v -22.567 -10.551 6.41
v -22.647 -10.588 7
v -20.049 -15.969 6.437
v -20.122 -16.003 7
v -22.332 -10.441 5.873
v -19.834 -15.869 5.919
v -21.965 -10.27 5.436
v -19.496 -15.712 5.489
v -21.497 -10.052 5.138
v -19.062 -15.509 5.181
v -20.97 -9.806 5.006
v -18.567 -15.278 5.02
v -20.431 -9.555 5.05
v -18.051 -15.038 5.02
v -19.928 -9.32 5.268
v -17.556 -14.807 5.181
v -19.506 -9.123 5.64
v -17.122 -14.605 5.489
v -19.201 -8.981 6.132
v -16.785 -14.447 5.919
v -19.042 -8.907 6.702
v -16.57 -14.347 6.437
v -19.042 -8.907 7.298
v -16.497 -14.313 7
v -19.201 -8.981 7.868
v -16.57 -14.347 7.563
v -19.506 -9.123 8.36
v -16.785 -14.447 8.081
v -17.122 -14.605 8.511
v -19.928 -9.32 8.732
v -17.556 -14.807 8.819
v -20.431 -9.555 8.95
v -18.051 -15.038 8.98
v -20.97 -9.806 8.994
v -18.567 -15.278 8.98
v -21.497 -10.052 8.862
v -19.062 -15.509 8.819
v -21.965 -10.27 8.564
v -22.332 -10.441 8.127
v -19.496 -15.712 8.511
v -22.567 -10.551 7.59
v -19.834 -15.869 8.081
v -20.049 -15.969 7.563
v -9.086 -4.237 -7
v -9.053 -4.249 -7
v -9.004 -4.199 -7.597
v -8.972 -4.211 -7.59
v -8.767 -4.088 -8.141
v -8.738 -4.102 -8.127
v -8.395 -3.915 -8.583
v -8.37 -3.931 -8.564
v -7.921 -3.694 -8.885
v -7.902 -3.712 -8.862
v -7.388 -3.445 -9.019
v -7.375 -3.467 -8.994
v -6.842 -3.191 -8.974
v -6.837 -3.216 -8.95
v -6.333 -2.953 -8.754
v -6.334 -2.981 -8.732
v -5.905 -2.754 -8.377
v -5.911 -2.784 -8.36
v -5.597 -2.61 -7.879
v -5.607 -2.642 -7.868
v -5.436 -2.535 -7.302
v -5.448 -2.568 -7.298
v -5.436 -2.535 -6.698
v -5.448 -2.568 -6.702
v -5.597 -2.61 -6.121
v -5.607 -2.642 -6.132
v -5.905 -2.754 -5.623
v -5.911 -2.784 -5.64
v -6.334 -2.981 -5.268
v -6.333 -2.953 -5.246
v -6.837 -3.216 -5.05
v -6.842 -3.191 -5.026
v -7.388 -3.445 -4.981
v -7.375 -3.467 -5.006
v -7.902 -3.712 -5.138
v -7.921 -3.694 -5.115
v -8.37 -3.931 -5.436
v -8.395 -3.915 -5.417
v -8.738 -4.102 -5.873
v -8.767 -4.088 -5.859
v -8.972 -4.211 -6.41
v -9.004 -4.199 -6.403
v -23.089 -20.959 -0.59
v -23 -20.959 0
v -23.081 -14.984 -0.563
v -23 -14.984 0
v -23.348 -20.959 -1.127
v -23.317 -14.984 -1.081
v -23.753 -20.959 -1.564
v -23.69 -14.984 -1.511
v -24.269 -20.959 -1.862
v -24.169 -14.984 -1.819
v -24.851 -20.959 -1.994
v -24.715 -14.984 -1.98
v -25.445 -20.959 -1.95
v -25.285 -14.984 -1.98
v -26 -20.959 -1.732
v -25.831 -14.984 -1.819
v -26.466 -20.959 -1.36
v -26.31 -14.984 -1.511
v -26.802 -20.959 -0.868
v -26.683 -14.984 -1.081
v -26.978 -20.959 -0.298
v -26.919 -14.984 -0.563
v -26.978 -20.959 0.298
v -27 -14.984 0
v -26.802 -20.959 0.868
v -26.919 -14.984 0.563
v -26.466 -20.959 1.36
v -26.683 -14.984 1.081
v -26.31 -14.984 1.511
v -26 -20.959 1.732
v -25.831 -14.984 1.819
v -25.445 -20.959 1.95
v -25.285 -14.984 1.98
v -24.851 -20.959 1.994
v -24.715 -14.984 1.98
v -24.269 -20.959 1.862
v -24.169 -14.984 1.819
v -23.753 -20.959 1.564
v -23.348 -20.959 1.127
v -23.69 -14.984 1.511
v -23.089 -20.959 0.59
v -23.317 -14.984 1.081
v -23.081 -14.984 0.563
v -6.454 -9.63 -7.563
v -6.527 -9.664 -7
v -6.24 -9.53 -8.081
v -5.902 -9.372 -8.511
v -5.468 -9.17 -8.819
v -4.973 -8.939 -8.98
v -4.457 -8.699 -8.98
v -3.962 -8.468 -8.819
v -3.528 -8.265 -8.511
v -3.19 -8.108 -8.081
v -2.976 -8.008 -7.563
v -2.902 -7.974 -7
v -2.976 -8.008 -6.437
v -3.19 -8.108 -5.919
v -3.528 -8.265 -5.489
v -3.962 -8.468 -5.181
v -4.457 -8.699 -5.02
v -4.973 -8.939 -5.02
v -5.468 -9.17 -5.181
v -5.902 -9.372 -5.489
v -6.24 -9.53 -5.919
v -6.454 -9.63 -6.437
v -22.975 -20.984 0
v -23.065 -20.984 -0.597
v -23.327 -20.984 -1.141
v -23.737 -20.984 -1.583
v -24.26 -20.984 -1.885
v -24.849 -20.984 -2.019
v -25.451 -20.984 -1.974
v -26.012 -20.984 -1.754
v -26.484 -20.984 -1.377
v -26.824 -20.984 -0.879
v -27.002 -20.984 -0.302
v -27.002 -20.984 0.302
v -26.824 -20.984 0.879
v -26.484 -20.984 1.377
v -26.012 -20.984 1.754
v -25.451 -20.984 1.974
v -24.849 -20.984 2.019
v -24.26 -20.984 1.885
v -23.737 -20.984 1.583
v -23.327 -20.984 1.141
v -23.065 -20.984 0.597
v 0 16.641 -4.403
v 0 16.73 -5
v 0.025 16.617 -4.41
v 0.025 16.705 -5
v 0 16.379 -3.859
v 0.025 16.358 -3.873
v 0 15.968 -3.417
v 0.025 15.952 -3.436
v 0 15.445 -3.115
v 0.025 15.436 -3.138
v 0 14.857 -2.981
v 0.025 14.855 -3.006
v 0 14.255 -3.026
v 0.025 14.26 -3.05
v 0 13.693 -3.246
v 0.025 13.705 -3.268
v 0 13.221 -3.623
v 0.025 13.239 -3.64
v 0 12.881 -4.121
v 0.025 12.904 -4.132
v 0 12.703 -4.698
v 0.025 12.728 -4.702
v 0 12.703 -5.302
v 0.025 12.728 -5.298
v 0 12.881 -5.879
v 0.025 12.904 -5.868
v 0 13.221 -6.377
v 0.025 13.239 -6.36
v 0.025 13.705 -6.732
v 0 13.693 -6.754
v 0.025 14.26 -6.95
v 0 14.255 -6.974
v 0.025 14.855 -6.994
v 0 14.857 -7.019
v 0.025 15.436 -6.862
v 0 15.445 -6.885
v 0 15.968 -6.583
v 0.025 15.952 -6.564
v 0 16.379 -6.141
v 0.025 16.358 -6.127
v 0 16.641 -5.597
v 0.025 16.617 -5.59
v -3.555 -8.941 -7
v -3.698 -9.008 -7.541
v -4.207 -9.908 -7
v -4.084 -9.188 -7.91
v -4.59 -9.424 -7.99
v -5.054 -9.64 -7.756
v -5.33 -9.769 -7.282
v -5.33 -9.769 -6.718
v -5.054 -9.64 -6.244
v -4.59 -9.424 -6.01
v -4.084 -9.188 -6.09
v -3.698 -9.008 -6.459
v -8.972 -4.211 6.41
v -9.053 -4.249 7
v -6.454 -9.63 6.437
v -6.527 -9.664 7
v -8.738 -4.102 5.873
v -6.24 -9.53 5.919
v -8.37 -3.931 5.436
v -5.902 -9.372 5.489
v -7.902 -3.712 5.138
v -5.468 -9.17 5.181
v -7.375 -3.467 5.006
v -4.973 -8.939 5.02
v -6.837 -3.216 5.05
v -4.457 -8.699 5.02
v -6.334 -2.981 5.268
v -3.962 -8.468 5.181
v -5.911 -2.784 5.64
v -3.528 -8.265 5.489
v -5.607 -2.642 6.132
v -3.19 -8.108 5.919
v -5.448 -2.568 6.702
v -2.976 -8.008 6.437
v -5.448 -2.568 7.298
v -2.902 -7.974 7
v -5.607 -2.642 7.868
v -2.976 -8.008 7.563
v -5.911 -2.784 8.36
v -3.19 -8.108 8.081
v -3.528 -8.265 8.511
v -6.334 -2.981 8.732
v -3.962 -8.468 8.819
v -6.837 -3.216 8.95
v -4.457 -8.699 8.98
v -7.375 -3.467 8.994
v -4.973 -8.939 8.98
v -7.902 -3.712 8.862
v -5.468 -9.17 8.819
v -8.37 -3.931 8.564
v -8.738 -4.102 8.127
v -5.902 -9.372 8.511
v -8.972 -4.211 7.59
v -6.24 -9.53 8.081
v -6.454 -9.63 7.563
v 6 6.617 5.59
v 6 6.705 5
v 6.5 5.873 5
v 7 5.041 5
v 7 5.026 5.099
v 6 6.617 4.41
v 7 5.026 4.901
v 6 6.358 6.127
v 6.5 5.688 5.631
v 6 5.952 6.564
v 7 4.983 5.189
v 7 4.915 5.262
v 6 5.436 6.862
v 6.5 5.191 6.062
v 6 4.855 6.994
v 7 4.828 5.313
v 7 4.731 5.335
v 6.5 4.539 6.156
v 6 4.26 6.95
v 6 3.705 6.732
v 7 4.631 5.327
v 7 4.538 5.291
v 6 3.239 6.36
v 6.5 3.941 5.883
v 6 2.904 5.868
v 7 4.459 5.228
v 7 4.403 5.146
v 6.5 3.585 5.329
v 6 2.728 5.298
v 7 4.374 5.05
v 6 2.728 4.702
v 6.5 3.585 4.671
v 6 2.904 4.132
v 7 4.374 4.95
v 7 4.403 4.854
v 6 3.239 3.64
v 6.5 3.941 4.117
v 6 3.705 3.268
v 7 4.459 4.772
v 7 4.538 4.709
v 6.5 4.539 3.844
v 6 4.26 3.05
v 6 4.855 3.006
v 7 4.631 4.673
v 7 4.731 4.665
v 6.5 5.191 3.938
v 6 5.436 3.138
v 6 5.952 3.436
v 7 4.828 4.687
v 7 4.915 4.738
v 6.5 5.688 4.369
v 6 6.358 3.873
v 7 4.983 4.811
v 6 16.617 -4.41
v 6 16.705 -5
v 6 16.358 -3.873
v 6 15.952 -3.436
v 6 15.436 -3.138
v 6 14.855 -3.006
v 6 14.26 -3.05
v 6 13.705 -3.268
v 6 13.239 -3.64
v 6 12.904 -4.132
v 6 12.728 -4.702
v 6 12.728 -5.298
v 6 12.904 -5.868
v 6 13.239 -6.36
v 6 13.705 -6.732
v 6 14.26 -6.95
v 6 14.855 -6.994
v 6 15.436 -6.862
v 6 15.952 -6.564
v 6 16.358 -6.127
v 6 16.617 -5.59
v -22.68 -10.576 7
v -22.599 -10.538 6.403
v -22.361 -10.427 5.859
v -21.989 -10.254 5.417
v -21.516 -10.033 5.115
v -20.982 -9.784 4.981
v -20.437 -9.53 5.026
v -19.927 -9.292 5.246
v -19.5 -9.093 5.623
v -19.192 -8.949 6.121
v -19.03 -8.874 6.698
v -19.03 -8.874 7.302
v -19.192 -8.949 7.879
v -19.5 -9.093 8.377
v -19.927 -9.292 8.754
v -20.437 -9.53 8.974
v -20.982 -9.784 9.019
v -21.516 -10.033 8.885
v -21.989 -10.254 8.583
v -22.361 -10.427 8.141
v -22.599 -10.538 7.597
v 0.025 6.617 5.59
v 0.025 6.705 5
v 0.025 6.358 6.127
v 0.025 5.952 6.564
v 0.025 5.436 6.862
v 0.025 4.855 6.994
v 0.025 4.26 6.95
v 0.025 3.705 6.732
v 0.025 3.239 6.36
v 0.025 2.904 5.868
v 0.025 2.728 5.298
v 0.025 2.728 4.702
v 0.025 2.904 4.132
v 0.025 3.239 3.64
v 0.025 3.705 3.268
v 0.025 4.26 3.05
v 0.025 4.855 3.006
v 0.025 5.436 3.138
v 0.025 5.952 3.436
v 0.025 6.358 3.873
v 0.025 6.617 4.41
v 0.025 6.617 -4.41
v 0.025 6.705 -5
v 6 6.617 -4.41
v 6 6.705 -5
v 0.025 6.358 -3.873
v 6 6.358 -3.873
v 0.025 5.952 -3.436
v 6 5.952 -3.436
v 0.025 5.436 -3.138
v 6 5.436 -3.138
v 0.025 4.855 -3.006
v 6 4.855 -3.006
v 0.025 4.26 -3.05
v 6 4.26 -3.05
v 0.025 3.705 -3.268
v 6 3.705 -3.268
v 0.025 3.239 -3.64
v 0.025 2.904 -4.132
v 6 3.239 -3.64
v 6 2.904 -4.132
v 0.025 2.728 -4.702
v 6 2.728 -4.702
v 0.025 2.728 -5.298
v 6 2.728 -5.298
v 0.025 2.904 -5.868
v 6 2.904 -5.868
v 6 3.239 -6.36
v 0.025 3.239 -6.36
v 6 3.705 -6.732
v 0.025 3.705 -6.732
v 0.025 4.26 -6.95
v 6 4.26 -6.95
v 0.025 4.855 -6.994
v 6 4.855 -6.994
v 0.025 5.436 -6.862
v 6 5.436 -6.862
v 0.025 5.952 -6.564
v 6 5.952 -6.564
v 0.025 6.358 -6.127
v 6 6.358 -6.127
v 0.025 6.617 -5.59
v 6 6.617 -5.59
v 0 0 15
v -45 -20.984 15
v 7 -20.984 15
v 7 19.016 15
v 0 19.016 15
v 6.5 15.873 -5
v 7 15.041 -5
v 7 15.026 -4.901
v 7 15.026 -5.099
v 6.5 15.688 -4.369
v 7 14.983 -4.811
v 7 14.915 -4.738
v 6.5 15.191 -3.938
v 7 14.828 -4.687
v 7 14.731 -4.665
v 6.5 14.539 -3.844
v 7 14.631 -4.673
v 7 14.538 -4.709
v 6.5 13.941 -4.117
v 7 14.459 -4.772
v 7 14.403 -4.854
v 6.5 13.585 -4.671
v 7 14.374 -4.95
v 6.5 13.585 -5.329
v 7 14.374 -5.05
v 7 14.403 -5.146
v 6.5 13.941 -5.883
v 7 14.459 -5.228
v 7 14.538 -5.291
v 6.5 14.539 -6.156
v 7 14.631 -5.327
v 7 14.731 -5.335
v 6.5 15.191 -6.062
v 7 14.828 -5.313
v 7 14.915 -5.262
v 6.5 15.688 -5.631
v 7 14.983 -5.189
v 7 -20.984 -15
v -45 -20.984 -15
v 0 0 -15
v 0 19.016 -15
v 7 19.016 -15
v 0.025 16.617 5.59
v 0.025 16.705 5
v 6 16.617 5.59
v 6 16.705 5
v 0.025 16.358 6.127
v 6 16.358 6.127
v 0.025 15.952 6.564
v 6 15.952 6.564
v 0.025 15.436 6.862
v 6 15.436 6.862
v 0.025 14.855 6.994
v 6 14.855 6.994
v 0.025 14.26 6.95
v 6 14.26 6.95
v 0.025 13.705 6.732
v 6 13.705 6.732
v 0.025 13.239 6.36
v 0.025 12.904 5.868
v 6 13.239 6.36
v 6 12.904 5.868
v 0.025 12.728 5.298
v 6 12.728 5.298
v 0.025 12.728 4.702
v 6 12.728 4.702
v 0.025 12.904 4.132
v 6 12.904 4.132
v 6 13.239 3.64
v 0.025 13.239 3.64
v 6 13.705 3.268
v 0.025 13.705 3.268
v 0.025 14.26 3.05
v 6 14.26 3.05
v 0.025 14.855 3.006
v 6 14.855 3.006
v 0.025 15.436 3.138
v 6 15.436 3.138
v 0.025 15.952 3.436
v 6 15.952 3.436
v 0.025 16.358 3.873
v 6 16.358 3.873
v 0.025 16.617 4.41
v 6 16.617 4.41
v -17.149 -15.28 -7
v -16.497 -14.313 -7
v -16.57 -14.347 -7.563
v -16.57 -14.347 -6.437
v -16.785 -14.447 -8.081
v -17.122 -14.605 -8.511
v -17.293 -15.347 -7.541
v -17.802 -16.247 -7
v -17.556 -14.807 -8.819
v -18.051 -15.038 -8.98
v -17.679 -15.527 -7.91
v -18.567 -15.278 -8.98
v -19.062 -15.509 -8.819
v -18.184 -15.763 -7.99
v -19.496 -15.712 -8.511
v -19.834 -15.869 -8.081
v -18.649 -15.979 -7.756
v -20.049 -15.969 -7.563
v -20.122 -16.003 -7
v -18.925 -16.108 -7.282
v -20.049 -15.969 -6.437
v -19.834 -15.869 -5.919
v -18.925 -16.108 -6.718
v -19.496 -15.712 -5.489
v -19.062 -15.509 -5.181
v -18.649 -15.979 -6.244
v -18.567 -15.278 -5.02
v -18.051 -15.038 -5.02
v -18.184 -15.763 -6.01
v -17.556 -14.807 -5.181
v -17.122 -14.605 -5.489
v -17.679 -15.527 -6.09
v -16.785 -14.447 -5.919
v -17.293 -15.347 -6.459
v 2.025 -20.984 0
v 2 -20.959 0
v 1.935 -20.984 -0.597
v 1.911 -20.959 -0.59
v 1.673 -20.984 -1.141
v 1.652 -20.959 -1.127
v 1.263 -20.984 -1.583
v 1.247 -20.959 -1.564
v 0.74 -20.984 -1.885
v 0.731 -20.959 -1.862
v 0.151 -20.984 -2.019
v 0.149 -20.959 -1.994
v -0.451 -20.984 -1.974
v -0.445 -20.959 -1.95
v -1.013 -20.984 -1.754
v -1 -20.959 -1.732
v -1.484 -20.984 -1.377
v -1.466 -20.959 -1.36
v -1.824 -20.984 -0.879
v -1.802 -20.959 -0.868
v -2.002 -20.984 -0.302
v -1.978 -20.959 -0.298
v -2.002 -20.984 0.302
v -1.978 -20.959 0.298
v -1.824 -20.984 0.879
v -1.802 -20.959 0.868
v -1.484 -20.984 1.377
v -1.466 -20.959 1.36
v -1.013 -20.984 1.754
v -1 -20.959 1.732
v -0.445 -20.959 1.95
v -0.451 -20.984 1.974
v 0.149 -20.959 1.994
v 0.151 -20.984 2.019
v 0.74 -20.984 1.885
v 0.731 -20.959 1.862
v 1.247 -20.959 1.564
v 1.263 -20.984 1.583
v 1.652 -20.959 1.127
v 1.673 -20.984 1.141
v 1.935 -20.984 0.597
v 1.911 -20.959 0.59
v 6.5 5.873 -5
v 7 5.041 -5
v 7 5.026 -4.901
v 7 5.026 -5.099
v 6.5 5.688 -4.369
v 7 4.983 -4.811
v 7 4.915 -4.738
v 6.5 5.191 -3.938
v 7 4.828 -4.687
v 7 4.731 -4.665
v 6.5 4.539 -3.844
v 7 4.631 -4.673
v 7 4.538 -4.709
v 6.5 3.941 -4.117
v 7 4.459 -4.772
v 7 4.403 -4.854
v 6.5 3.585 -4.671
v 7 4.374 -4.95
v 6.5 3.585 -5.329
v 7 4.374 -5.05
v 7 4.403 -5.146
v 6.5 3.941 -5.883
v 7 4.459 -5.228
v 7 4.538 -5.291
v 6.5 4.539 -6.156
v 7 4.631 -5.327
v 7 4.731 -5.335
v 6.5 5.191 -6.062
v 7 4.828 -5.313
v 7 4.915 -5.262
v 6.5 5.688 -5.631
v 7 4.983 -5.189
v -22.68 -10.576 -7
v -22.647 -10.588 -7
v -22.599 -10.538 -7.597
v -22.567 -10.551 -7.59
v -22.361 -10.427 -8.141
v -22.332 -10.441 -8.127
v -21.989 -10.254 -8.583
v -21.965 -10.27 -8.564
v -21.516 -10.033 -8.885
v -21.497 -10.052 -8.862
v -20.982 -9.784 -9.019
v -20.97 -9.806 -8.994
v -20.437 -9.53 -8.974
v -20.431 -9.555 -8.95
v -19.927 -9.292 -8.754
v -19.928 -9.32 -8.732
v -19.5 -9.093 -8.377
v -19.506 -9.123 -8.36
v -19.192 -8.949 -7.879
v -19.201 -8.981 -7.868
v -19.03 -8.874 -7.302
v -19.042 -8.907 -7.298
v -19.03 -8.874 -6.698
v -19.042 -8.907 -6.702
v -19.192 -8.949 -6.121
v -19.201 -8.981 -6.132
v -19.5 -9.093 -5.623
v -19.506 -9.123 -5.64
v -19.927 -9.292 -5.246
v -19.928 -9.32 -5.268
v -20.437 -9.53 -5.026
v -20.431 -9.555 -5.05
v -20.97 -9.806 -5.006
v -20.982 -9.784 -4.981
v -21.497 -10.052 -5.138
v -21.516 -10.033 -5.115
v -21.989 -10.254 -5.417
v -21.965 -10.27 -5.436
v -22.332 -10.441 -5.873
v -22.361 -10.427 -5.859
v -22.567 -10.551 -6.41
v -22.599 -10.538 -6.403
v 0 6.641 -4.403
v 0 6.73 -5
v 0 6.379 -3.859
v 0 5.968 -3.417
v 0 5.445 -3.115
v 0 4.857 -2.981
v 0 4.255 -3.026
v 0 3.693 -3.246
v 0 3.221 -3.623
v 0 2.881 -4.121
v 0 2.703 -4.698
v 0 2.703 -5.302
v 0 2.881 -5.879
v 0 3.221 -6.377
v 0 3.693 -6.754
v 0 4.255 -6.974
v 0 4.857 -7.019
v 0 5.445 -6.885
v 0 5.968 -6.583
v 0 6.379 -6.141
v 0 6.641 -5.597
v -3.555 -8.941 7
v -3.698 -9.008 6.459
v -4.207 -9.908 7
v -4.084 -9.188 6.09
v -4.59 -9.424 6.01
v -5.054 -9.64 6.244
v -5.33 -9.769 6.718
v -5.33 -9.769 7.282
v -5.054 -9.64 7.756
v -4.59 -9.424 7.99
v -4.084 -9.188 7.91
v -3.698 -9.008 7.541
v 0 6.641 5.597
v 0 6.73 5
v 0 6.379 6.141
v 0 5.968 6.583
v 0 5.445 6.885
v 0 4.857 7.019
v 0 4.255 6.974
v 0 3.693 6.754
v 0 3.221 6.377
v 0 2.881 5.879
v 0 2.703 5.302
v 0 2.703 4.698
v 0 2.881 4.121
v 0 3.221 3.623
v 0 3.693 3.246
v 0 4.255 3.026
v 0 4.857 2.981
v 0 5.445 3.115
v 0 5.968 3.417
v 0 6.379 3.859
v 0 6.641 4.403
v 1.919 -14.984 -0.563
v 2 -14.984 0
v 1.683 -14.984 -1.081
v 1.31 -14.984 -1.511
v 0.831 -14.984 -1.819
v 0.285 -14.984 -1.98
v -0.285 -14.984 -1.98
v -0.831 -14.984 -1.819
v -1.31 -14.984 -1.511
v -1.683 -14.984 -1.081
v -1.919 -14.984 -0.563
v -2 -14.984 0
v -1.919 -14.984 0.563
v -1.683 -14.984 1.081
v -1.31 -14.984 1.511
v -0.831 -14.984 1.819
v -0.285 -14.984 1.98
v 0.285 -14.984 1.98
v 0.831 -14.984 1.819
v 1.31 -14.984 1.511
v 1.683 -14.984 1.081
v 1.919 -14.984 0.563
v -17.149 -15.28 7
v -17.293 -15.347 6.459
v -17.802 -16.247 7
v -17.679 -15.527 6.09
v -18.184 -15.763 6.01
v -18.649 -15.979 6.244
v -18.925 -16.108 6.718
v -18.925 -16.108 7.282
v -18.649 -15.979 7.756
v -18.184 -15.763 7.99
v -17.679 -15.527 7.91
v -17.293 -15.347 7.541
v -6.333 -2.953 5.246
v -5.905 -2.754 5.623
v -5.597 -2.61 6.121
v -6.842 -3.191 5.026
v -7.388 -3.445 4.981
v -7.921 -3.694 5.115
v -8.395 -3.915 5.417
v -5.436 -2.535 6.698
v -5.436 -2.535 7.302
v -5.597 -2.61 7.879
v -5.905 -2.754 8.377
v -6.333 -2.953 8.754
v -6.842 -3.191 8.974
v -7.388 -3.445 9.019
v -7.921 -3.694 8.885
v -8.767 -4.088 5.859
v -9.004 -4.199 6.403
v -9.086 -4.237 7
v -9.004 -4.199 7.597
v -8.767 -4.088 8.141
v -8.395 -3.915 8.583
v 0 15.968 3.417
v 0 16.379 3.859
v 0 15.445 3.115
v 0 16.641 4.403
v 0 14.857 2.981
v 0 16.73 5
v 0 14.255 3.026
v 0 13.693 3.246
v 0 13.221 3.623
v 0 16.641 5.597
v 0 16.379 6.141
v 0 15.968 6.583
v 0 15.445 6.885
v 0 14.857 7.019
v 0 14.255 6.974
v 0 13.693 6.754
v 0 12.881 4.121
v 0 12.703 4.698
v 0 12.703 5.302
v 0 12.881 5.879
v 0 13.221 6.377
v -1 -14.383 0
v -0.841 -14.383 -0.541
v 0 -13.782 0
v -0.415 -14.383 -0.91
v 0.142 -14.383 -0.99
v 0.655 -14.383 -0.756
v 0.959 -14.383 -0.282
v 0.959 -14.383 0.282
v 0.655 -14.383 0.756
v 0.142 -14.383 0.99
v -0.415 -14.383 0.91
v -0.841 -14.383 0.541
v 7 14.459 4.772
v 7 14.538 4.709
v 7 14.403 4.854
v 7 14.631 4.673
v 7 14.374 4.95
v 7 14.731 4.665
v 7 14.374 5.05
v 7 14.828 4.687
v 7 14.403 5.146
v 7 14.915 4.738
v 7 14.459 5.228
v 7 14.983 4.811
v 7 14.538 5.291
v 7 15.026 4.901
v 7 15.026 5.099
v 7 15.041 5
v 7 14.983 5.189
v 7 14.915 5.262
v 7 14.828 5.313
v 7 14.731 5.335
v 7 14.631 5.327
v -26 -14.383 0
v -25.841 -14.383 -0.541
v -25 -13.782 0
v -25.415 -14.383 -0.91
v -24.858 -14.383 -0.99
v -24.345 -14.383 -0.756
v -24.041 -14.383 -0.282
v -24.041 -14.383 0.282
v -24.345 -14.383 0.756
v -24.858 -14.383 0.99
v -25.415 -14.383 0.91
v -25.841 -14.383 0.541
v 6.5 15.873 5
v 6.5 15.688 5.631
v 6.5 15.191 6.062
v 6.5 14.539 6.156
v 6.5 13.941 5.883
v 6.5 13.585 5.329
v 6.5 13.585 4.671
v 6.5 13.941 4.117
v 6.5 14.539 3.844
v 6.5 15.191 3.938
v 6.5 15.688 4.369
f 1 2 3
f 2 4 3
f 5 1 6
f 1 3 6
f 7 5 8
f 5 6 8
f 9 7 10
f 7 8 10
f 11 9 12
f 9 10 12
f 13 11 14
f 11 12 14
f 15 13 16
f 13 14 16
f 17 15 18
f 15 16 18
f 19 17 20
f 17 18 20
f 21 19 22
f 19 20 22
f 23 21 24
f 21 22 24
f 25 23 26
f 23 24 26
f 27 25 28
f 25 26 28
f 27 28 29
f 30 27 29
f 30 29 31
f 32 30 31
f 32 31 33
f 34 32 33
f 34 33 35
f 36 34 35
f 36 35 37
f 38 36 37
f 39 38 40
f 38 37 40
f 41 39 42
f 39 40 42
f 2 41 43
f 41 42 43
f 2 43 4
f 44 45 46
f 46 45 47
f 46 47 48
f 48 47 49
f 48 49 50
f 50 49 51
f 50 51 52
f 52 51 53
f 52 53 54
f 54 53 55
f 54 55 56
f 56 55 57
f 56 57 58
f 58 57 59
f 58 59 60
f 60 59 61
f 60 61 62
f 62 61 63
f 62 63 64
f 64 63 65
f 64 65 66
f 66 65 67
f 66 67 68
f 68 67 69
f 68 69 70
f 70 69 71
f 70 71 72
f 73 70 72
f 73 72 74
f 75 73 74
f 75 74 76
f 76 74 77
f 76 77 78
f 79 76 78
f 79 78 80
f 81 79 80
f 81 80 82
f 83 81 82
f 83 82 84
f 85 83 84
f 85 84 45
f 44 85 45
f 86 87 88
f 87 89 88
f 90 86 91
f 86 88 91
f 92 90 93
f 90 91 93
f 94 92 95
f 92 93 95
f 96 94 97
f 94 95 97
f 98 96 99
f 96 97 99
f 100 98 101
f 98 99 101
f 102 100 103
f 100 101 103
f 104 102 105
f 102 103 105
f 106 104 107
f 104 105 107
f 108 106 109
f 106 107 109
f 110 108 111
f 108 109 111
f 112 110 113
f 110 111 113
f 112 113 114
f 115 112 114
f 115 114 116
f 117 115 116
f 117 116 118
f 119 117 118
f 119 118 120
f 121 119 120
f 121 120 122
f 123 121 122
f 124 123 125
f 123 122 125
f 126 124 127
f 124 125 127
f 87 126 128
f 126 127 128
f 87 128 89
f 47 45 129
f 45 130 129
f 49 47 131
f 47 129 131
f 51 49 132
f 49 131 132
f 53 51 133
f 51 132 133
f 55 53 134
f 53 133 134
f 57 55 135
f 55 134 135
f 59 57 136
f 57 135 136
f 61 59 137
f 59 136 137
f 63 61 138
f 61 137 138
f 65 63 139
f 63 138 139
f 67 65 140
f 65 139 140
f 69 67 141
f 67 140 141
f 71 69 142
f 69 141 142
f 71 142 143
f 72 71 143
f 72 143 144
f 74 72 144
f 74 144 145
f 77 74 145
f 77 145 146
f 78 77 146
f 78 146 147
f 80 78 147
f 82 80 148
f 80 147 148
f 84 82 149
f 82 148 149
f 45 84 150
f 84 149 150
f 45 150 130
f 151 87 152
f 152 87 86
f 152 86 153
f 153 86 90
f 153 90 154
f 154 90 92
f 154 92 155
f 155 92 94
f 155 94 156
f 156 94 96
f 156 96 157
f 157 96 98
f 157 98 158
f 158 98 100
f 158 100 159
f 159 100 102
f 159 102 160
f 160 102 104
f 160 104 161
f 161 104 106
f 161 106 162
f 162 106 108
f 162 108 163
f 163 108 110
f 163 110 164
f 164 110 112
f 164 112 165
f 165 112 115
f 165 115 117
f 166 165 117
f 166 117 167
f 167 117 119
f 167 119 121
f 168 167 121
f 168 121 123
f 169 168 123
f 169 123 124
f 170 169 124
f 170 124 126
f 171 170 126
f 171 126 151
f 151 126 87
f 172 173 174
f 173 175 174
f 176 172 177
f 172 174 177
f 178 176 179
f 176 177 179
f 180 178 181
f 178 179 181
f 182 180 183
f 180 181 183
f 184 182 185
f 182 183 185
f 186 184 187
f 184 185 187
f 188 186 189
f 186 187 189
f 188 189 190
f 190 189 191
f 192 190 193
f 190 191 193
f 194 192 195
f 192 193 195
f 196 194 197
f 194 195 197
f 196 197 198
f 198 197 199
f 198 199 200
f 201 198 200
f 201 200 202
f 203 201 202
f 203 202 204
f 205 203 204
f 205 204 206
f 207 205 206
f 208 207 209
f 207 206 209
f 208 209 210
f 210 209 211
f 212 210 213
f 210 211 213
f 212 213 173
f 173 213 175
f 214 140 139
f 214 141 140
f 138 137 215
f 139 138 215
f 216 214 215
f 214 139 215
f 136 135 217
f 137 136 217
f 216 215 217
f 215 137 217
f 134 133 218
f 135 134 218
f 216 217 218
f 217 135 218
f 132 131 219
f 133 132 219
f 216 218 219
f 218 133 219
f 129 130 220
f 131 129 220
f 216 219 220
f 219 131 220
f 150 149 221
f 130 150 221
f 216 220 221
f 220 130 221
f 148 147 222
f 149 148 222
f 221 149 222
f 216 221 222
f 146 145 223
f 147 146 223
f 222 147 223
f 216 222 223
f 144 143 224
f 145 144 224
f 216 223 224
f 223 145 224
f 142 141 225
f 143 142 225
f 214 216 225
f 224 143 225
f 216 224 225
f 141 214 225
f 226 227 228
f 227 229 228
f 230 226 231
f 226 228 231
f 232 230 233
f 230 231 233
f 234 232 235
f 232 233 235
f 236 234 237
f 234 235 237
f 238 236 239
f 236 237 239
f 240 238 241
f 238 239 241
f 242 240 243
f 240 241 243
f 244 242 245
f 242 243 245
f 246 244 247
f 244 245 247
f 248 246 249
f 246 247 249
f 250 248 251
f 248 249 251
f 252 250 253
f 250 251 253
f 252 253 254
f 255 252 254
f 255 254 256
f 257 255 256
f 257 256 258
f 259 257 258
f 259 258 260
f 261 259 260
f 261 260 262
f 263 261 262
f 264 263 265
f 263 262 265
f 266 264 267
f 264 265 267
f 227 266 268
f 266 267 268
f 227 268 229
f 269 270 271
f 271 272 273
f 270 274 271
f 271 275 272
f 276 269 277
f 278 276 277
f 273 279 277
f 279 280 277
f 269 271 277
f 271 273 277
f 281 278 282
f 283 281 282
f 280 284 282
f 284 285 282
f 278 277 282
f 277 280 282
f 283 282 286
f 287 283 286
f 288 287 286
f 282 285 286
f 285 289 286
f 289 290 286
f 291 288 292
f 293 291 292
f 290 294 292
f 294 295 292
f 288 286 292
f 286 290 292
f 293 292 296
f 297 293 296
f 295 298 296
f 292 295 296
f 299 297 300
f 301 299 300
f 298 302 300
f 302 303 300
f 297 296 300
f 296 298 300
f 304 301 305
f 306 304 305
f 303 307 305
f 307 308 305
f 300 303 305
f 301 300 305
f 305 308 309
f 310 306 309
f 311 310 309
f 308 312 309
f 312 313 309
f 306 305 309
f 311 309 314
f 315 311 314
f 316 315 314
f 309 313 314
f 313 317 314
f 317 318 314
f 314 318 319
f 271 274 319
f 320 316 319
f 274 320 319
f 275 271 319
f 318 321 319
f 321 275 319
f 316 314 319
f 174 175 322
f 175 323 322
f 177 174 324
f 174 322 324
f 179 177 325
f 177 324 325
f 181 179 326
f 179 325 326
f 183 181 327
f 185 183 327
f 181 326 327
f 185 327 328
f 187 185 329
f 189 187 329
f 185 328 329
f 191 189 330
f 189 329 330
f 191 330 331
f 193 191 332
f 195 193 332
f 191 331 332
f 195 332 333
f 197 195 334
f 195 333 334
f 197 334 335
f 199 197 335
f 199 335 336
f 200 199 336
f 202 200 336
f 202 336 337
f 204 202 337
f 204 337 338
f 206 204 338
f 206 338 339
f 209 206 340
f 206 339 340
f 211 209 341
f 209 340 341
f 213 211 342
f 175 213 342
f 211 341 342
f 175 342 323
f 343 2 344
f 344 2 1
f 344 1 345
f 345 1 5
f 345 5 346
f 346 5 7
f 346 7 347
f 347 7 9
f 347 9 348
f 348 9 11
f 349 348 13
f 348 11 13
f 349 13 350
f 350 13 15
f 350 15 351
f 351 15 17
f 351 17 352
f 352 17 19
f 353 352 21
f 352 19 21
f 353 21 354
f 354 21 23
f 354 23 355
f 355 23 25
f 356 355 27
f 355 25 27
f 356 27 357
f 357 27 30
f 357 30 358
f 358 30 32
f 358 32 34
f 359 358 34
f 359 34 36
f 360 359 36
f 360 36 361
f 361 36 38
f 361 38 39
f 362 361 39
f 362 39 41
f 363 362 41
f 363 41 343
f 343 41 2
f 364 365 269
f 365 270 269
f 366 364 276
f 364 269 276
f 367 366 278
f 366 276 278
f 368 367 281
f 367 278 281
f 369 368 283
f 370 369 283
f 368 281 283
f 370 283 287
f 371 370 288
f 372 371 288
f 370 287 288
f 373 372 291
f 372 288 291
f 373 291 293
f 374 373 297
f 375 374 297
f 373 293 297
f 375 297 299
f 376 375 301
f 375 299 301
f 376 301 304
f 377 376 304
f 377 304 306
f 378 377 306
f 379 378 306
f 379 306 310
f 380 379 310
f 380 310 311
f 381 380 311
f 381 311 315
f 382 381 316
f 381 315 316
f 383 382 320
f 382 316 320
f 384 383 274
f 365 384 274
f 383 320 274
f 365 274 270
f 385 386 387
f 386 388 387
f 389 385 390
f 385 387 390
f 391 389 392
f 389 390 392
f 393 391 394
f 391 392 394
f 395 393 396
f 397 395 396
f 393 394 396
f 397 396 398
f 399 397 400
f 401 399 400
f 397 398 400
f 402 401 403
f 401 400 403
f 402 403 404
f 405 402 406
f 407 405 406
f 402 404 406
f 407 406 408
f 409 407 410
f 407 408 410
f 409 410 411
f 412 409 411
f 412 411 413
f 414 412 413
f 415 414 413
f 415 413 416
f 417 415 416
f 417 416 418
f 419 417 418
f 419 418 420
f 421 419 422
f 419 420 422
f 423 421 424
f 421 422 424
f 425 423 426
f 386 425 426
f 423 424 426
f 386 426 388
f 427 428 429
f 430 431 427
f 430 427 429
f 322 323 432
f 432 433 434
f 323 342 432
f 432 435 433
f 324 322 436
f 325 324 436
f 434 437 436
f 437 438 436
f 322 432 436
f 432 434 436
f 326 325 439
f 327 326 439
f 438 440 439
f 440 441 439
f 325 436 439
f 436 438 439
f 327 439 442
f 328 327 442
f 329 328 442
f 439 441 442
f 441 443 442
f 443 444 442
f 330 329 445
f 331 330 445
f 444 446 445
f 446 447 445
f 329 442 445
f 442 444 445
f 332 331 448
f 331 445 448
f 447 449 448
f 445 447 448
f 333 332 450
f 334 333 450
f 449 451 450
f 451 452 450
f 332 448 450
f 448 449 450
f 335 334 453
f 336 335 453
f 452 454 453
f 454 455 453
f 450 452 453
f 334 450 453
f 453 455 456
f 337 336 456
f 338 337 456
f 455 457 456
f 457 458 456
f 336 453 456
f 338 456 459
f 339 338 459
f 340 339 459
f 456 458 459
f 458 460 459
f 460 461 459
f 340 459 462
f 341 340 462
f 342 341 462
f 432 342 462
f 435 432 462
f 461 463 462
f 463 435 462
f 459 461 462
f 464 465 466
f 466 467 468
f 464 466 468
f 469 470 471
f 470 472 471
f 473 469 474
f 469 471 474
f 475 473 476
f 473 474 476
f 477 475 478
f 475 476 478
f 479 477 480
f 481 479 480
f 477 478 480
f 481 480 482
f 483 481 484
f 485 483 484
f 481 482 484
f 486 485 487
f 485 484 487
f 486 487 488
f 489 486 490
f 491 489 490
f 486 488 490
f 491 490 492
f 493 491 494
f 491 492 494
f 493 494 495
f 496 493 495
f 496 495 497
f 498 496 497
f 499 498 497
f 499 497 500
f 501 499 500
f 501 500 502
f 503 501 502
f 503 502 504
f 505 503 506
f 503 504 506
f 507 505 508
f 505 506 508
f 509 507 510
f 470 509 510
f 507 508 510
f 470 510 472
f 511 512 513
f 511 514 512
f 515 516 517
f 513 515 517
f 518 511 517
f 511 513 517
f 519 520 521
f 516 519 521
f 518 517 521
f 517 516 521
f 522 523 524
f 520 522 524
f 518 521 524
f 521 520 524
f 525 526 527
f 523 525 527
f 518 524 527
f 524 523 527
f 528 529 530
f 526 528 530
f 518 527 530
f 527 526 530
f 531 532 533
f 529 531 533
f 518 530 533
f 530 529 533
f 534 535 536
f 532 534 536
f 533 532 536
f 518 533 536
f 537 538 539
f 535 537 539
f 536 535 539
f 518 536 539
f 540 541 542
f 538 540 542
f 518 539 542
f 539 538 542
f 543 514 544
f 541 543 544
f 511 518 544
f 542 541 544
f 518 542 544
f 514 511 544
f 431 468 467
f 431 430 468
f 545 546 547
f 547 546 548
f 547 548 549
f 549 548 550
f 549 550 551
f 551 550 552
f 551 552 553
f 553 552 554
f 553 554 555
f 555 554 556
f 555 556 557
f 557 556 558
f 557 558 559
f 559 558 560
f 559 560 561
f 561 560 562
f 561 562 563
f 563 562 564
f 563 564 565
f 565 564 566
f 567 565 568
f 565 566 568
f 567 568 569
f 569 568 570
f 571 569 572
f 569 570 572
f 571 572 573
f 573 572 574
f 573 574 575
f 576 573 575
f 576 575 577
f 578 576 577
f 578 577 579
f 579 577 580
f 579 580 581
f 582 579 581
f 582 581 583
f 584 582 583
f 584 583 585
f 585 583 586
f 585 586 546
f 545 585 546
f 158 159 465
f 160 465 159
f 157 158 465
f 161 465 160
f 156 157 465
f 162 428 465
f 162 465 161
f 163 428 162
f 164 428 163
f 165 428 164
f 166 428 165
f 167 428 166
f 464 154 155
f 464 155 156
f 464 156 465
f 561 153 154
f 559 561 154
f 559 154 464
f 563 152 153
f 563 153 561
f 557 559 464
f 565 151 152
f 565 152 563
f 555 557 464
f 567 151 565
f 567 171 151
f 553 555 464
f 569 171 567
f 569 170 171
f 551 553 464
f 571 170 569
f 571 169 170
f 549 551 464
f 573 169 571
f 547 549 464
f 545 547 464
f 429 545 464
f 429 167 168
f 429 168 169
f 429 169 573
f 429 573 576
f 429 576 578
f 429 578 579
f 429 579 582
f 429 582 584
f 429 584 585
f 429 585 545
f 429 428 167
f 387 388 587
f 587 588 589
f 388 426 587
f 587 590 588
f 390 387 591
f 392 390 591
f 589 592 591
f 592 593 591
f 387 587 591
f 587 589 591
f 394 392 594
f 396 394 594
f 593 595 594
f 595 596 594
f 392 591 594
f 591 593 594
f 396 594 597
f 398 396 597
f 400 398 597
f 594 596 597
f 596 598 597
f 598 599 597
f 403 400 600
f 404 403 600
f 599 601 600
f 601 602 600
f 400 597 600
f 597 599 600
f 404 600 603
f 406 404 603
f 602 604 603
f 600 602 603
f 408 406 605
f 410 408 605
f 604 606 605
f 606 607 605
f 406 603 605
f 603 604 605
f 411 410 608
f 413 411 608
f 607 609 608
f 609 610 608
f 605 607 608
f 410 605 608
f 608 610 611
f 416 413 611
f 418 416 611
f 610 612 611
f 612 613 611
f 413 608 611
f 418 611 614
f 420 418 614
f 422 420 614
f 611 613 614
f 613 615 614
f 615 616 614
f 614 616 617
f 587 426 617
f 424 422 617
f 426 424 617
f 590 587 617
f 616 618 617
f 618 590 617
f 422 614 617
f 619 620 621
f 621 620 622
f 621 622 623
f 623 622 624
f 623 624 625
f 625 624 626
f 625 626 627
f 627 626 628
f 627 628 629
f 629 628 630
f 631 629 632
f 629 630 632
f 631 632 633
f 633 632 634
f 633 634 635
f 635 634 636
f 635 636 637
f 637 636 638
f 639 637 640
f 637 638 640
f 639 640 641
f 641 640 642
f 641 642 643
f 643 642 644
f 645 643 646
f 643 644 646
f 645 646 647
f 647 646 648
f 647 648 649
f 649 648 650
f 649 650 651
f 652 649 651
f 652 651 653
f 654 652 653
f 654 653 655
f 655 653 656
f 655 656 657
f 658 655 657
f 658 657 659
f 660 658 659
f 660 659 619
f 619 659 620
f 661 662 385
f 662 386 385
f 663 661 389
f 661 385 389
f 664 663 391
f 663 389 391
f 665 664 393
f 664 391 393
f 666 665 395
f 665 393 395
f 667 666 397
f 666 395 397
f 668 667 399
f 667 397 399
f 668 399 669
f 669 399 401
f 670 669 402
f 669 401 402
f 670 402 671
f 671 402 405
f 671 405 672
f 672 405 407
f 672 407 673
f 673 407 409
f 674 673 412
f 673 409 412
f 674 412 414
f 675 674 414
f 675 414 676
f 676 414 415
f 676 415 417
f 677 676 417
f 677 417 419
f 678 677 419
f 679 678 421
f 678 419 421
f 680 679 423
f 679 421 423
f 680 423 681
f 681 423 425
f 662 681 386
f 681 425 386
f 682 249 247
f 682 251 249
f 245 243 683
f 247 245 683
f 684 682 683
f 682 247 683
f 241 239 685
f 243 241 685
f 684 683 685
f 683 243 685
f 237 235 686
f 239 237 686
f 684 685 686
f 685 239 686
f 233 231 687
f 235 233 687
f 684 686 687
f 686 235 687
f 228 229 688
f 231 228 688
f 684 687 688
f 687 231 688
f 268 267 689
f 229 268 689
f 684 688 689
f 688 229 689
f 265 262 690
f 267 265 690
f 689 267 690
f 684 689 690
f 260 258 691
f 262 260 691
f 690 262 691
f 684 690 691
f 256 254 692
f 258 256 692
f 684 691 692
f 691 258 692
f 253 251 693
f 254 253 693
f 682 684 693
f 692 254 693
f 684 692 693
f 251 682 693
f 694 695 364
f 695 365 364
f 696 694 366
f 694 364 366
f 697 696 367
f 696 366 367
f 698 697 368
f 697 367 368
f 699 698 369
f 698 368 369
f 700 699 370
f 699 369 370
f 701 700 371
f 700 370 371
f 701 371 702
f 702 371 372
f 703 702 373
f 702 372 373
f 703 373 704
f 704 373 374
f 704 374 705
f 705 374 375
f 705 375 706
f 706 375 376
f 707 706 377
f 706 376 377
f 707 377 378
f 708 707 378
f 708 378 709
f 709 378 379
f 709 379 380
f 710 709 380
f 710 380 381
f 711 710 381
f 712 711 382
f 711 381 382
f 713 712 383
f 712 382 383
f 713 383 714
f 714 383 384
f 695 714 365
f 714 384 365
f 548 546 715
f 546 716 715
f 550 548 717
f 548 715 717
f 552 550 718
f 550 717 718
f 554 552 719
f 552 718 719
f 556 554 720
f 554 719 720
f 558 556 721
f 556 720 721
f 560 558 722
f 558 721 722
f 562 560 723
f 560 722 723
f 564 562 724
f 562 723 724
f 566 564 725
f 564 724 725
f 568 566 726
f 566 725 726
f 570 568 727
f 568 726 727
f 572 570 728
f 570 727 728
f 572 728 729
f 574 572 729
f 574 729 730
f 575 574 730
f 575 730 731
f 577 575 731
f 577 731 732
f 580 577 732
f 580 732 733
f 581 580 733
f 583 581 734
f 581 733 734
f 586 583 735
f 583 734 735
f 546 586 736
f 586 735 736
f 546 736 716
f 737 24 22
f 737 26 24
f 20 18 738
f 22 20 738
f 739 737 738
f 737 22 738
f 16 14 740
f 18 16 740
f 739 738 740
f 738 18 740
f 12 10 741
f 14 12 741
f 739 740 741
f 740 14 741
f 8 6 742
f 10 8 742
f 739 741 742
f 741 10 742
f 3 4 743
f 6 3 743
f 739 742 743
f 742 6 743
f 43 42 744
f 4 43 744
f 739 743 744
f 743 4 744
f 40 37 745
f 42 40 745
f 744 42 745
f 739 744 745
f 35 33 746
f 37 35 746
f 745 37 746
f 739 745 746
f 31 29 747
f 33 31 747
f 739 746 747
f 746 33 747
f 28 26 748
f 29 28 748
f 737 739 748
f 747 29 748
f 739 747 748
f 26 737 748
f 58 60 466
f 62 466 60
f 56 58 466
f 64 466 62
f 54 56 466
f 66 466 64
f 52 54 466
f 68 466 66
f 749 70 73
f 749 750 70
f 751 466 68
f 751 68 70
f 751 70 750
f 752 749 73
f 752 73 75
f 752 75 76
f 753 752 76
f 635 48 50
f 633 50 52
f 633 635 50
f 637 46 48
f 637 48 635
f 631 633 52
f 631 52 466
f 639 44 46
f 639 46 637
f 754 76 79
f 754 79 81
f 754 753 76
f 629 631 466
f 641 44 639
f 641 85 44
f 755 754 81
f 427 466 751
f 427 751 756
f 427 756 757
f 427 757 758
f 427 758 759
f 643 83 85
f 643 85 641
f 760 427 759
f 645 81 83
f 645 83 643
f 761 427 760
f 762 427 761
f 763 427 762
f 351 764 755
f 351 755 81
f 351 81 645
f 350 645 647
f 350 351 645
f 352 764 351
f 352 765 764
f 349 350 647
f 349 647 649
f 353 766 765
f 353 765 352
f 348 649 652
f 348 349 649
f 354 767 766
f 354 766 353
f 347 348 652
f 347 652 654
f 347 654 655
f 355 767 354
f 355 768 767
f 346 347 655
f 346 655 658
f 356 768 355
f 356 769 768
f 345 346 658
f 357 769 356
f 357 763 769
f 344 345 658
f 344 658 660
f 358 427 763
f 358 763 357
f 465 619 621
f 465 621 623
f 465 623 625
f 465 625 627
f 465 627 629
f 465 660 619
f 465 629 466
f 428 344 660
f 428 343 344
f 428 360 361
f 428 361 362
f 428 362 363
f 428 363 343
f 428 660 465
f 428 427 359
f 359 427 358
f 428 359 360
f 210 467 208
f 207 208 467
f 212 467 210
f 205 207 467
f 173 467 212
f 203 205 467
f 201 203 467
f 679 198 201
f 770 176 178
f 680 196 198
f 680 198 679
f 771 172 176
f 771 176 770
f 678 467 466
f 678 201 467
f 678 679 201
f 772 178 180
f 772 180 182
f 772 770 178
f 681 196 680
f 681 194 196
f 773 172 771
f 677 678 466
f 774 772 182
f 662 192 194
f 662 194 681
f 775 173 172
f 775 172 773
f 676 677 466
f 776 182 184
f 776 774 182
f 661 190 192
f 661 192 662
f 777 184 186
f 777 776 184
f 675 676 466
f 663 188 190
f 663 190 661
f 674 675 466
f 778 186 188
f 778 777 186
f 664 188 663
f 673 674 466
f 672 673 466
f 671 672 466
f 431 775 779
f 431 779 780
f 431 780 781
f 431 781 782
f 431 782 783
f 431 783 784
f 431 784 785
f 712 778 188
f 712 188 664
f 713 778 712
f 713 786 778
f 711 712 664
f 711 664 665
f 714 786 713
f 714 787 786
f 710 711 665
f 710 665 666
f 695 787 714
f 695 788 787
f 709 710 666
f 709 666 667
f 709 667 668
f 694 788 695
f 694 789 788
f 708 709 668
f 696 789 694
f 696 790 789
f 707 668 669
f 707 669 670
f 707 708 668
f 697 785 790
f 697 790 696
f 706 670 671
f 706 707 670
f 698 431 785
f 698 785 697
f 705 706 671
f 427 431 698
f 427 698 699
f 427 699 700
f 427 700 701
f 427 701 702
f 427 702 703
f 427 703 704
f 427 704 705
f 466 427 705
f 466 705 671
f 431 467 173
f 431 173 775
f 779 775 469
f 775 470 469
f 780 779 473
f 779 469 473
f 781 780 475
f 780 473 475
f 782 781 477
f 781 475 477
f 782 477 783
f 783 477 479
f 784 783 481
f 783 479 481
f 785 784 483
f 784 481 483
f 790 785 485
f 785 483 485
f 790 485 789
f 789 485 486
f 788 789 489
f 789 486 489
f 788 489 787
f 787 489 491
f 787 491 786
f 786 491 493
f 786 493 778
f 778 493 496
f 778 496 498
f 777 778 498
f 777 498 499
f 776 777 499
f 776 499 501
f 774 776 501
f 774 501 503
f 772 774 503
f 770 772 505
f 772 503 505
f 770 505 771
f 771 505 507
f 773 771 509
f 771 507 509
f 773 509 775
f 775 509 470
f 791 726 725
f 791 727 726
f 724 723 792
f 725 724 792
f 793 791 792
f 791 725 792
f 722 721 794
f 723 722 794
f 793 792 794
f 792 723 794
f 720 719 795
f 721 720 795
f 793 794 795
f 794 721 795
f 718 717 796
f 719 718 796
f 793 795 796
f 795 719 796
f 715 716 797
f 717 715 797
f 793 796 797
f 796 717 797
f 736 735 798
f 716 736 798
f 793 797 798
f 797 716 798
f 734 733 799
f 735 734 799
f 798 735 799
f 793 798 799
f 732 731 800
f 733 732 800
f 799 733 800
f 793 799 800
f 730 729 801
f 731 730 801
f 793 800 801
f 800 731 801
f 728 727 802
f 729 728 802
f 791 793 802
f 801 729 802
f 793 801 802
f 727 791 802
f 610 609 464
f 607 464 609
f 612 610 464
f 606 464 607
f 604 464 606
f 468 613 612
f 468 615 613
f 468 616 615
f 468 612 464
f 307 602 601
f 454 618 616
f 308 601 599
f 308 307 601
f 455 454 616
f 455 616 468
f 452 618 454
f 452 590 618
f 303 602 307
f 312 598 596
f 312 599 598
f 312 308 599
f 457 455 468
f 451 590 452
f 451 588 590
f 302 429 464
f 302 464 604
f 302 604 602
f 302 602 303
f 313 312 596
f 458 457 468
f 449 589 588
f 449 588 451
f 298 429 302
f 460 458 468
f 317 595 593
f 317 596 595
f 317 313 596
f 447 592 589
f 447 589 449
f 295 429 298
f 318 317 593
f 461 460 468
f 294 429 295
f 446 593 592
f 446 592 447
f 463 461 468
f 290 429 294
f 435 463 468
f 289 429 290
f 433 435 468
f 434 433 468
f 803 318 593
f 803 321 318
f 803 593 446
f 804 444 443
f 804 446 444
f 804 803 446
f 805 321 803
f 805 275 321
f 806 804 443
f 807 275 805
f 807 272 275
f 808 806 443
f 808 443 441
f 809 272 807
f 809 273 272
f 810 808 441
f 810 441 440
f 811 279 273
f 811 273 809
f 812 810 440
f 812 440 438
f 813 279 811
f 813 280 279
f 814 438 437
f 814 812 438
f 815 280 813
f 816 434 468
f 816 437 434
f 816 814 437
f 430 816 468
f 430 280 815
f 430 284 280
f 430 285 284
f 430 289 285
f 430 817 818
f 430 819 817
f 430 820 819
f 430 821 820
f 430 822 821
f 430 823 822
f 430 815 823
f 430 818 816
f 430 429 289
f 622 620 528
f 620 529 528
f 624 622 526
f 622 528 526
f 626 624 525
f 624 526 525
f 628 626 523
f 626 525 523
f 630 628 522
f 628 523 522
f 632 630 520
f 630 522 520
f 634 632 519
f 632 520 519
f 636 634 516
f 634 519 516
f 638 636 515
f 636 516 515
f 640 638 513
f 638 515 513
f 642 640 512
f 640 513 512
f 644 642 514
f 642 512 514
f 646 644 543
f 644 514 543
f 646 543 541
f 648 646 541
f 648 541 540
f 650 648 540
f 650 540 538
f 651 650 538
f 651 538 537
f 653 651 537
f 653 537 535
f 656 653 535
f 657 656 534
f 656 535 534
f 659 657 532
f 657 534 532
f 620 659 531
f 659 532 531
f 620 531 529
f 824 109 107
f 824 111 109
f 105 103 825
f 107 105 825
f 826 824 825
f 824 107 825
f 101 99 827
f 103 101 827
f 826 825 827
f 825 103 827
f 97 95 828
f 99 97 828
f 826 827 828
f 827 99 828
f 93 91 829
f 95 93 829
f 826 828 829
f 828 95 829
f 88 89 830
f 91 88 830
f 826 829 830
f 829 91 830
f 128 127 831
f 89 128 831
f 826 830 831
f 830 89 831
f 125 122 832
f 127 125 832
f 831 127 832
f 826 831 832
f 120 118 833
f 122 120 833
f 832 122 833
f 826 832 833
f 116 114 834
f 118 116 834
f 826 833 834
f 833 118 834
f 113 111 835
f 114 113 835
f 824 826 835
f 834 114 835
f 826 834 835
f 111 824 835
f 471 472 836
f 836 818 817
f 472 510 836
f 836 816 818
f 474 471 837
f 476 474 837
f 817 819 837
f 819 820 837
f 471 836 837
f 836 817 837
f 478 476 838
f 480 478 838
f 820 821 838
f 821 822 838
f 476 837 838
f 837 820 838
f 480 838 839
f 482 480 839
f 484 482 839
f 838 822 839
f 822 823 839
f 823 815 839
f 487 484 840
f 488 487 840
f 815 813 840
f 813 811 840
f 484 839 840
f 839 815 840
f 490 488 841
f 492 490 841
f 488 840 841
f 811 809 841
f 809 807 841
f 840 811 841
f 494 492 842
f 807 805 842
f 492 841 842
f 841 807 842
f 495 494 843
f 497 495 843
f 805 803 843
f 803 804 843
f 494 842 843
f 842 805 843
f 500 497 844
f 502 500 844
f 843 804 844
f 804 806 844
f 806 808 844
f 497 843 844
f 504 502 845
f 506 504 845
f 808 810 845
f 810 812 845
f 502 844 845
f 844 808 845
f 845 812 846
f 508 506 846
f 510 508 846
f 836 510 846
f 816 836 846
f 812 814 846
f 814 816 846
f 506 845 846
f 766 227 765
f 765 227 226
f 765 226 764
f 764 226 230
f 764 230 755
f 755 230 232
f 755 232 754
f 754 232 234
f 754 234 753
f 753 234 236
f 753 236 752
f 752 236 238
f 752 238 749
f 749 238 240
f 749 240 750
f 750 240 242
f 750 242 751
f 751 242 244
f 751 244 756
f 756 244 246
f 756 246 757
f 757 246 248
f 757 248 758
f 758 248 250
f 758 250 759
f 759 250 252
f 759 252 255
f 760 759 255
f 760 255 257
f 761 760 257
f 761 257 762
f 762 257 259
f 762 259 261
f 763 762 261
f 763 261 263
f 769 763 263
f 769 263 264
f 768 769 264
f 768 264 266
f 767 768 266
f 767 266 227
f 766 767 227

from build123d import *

# Parameters (mm, degrees)
BOSS_EXTRUDE1_DEPTH             = 15
F_4_0MM_DOWEL_HOLE1_D           = 4
F_4_0MM_DOWEL_HOLE1_DEPTH       = 6
F_4_0MM_DOWEL_HOLE1_CSINK_D     = 4.05
F_4_0MM_DOWEL_HOLE1_CSINK_ANGLE = 90
F_4_0MM_DOWEL_HOLE1_TIP         = 1.201721238
F_4_0MM_DOWEL_HOLE3_D           = 4
F_4_0MM_DOWEL_HOLE3_DEPTH       = 6
F_4_0MM_DOWEL_HOLE3_CSINK_D     = 4.05
F_4_0MM_DOWEL_HOLE3_CSINK_ANGLE = 90
F_4_0MM_DOWEL_HOLE3_TIP         = 1.201721238


# Read off the part's stored shape, not the designer's step: Ø4.0mm Dowel Hole4
with BuildPart() as part:
    # Sketch1 → Boss-Extrude1 (new, symmetric)
    with BuildSketch(Plane.XY):
        Polygon((0, 19.016155383), (0, 0), (-45, -20.983844617), (7, -20.983844617), (7, 19.016155383), align=None)
    extrude(amount=BOSS_EXTRUDE1_DEPTH, both=True)

    # Ø4.0mm Dowel Hole1
    with Locations(Plane(origin=(0, -20.983844617, 0), x_dir=(-1, 0, 0), z_dir=(0, -1, 0))):
        with Locations((0, 0), (25, 0)):
            CounterSinkHole(F_4_0MM_DOWEL_HOLE1_D / 2, F_4_0MM_DOWEL_HOLE1_CSINK_D / 2, depth=F_4_0MM_DOWEL_HOLE1_DEPTH, counter_sink_angle=F_4_0MM_DOWEL_HOLE1_CSINK_ANGLE)
            with Locations((0, 0, -(F_4_0MM_DOWEL_HOLE1_DEPTH + F_4_0MM_DOWEL_HOLE1_TIP / 2))):  # 118° drill point
                Cone(0, F_4_0MM_DOWEL_HOLE1_D / 2, F_4_0MM_DOWEL_HOLE1_TIP, mode=Mode.SUBTRACT)

    # Ø4.0mm Dowel Hole3
    with Locations(Plane(origin=(0, 0, 0), x_dir=(0.9063077870366525, 0.422618261740694, 0), z_dir=(-0.422618261740694, 0.9063077870366525, 0))):
        with Locations((-23, 7), (-8, 7), (-8, -7), (-23, -7)):
            CounterSinkHole(F_4_0MM_DOWEL_HOLE3_D / 2, F_4_0MM_DOWEL_HOLE3_CSINK_D / 2, depth=F_4_0MM_DOWEL_HOLE3_DEPTH, counter_sink_angle=F_4_0MM_DOWEL_HOLE3_CSINK_ANGLE)
            with Locations((0, 0, -(F_4_0MM_DOWEL_HOLE3_DEPTH + F_4_0MM_DOWEL_HOLE3_TIP / 2))):  # 118° drill point
                Cone(0, F_4_0MM_DOWEL_HOLE3_D / 2, F_4_0MM_DOWEL_HOLE3_TIP, mode=Mode.SUBTRACT)

    # Ø4.0mm Dowel Hole4 outline → Ø4.0mm Dowel Hole4 (revolve, cut)
    with BuildSketch(Plane(origin=(0, 4.705485654, 5), x_dir=(0, 1, 0), z_dir=(0, 0, -1))):
        Polygon((0, 0), (2.025, 0), (2, 0.025), (2, 6), (0.335720518, 7), (0, 7), align=None)
    revolve(axis=Axis((0, 4.705485654, 5), (1, 0, 0)), mode=Mode.SUBTRACT)

    # 4.0mm Dowel Hole4 2 outline → 4.0mm Dowel Hole4 2 (revolve, cut)
    with BuildSketch(Plane(origin=(0, 14.705485654, -5), x_dir=(0, 1, 0), z_dir=(0, 0, -1))):
        Polygon((0, 0), (2.025, 0), (2, 0.025), (2, 6), (0.335720518, 7), (0, 7), align=None)
    revolve(axis=Axis((0, 14.705485654, -5), (1, 0, 0)), mode=Mode.SUBTRACT)

    # 4.0mm Dowel Hole4 3 outline → 4.0mm Dowel Hole4 3 (revolve, cut)
    with BuildSketch(Plane(origin=(0, 4.705485654, -5), x_dir=(0, 1, 0), z_dir=(0, 0, -1))):
        Polygon((0, 0), (2.025, 0), (2, 0.025), (2, 6), (0.335720518, 7), (0, 7), align=None)
    revolve(axis=Axis((0, 4.705485654, -5), (1, 0, 0)), mode=Mode.SUBTRACT)

    # 4.0mm Dowel Hole4 4 outline → 4.0mm Dowel Hole4 4 (revolve, cut)
    with BuildSketch(Plane(origin=(0, 14.705485654, 5), x_dir=(0, 1, 0), z_dir=(0, 0, -1))):
        Polygon((0, 0), (2.025, 0), (2, 0.025), (2, 6), (0.335720518, 7), (0, 7), align=None)
    revolve(axis=Axis((0, 14.705485654, 5), (1, 0, 0)), mode=Mode.SUBTRACT)


solid = part.part
